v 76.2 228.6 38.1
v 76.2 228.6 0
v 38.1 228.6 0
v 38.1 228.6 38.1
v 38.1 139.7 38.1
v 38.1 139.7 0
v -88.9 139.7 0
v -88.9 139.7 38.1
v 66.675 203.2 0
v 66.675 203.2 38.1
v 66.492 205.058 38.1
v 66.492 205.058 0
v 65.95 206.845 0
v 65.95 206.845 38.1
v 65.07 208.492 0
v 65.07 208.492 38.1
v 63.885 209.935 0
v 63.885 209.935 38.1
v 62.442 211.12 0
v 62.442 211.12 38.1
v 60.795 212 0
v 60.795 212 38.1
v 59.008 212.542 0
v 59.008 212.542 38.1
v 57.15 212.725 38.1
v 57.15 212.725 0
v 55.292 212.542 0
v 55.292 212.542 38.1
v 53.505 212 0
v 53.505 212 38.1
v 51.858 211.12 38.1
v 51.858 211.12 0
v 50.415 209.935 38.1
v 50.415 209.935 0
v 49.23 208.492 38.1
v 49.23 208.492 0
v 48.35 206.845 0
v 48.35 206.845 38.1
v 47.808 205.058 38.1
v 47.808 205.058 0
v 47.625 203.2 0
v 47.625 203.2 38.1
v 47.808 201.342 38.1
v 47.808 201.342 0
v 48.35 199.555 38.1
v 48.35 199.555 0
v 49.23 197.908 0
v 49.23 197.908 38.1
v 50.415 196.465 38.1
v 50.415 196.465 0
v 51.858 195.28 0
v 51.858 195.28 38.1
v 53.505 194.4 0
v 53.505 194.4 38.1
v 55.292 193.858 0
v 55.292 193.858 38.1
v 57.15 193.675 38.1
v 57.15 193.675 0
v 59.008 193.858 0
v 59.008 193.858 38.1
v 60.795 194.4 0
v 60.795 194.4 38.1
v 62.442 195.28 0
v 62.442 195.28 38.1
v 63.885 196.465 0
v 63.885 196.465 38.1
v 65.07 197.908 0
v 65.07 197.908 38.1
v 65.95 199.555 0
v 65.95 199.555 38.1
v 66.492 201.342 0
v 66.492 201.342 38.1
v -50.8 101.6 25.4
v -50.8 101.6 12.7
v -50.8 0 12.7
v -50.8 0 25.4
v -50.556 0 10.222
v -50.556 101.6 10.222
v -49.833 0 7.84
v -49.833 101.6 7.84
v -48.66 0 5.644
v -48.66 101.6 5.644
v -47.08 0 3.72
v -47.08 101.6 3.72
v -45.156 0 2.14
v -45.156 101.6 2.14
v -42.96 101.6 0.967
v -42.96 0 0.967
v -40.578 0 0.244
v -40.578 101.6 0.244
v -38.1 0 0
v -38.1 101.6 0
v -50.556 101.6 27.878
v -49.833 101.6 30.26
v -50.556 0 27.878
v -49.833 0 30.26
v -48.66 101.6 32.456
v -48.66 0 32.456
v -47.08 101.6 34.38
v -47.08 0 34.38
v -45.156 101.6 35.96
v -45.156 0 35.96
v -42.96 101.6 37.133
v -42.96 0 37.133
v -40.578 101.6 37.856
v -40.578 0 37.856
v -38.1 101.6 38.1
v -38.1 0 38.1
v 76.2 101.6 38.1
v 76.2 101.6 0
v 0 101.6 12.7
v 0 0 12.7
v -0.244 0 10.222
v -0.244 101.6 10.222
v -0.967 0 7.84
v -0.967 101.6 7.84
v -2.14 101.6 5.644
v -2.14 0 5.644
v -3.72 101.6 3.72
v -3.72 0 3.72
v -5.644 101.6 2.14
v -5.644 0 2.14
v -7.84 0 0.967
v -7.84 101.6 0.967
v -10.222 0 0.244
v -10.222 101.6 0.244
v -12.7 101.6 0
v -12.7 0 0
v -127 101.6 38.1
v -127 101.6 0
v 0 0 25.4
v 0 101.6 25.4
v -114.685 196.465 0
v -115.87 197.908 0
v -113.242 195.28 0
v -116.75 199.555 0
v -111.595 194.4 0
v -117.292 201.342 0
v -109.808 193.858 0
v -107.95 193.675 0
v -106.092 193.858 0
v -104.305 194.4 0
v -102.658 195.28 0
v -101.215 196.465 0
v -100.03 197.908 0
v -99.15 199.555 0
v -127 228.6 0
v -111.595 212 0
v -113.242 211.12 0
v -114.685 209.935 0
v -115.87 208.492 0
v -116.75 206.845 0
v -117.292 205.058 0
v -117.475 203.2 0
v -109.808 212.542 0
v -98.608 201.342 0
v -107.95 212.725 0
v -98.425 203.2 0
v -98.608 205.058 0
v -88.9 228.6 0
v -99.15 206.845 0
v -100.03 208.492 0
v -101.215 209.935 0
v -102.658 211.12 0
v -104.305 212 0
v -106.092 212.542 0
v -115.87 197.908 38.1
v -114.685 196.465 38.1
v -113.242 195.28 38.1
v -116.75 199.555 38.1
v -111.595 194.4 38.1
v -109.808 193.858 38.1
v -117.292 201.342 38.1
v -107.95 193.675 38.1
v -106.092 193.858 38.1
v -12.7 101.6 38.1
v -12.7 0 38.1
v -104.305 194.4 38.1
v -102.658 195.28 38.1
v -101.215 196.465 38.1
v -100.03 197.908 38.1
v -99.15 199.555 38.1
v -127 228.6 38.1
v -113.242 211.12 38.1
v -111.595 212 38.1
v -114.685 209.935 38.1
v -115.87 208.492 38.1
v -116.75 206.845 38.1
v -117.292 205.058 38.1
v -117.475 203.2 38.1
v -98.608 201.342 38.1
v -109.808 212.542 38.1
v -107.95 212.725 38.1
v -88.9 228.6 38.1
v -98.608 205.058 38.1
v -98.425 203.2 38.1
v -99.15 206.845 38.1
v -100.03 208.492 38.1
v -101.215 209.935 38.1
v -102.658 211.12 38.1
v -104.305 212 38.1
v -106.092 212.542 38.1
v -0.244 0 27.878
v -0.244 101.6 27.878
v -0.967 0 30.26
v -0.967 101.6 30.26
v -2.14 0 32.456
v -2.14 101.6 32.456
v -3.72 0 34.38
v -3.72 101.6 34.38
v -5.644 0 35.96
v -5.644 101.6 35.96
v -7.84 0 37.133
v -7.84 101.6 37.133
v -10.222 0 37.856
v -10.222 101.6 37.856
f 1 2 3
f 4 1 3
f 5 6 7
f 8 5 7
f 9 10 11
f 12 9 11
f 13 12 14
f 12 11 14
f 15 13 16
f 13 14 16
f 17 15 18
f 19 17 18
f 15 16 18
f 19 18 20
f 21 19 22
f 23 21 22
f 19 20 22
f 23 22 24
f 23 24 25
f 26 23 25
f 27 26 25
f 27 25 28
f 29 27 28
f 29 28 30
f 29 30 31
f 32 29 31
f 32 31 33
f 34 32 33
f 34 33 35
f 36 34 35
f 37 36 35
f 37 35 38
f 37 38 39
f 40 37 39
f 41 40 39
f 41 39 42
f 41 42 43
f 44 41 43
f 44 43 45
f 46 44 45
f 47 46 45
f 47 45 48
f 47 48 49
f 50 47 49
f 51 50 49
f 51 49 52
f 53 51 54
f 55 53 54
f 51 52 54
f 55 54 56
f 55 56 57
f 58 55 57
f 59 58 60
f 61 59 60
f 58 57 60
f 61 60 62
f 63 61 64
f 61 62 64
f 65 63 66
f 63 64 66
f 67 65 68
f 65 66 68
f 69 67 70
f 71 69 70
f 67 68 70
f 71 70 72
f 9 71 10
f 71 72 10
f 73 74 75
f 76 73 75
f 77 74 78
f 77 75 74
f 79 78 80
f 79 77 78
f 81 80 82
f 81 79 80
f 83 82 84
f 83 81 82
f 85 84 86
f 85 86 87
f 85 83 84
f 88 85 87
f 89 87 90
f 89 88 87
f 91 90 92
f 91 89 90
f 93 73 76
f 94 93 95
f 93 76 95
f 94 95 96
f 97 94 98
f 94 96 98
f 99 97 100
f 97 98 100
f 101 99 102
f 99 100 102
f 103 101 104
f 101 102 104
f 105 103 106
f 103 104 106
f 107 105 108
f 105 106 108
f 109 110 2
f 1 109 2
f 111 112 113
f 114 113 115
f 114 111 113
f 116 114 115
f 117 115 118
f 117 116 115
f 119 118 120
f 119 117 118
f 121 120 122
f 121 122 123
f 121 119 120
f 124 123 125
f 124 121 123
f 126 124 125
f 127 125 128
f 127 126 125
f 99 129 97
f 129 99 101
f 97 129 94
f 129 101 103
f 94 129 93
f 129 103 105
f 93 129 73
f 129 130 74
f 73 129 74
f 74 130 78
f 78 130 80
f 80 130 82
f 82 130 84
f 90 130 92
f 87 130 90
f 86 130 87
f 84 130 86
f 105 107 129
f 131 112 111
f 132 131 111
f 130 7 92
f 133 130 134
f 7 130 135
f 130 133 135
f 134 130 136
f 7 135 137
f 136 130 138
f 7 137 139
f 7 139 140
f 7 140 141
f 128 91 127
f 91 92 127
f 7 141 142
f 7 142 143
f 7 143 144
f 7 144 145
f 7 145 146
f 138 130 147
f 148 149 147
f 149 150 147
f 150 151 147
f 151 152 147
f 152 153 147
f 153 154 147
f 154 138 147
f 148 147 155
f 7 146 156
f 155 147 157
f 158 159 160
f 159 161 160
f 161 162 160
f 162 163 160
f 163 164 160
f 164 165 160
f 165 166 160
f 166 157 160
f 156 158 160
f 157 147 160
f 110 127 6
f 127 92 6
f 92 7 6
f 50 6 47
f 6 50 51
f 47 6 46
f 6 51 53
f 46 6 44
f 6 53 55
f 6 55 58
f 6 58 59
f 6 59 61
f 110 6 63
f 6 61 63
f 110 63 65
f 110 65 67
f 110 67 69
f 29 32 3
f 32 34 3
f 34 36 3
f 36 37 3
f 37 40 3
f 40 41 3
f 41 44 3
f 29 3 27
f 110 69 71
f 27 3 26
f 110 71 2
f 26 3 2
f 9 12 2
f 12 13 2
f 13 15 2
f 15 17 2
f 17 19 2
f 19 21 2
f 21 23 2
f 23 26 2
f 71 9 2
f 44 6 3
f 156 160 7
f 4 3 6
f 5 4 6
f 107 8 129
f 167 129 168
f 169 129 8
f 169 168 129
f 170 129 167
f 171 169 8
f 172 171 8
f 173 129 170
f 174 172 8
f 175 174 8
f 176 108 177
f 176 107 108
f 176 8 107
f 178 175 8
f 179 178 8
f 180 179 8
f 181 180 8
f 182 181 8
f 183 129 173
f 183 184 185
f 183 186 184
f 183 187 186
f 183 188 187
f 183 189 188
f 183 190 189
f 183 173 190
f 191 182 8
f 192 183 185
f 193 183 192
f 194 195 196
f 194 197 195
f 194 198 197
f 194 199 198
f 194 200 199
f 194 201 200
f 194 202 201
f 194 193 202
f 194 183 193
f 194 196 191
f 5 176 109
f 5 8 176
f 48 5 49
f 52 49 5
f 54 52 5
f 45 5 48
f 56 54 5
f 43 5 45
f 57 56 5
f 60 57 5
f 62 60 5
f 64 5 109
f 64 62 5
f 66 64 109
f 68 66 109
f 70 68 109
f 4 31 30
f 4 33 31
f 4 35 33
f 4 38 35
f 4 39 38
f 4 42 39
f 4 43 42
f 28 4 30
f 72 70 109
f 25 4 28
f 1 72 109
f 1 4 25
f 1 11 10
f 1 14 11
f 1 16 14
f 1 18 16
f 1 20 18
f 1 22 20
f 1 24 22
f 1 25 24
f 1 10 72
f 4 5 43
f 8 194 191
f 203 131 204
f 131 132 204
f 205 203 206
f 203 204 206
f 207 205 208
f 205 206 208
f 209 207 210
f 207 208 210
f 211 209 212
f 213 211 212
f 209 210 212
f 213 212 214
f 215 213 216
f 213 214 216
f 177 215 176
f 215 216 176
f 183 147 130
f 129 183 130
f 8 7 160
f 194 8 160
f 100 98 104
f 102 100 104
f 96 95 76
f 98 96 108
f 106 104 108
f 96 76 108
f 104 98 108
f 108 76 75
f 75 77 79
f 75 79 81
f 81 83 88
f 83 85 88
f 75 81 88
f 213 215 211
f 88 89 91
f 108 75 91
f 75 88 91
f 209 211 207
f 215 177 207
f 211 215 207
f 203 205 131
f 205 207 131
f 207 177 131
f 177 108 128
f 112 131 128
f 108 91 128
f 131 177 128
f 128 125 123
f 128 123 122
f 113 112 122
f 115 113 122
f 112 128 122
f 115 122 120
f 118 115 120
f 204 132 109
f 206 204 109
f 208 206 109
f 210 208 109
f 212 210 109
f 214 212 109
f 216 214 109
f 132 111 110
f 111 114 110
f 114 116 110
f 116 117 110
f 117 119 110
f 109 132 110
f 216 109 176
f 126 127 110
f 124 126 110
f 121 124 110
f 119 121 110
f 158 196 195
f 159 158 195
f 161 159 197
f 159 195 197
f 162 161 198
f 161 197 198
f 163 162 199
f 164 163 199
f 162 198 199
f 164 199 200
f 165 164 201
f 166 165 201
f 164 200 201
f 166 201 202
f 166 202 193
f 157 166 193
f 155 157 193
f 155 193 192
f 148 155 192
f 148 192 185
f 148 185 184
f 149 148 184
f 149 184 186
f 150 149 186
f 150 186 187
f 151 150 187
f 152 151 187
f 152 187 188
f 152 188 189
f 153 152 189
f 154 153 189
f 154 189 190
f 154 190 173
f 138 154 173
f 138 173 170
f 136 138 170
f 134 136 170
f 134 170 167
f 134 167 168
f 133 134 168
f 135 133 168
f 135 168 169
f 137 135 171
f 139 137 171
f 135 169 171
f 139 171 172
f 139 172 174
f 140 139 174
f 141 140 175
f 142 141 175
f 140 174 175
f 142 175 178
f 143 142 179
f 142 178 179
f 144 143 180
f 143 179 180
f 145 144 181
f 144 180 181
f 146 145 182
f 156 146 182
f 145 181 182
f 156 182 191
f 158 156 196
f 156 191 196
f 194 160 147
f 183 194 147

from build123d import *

# Parameters (mm, degrees)
F0_W     = 38.1
F0_H     = 38.1
F1_DEPTH = 38.1
F2_R     = 12.7
F4_DEPTH = 38.101


with BuildPart() as f1:
    # F0 (on Top) → F1 (new body)
    with BuildSketch(Plane.XY):
        Polygon((-50.8, 0), (0, 0), (0, 101.6), (0, 139.7), (-50.8, 139.7), (-50.8, 101.6), align=None)
        with Locations((19.05, 120.65)):
            Rectangle(F0_W, F0_H)
        with Locations((-69.85, 120.65)):
            Rectangle(F0_W, F0_H)
        Polygon((38.1, 139.7), (38.1, 101.6), (76.2, 101.6), (76.2, 228.6), (38.1, 228.6), align=None)
        Polygon((-127, 101.6), (-88.9, 101.6), (-88.9, 139.7), (-88.9, 228.6), (-127, 228.6), align=None)
    extrude(amount=F1_DEPTH)

    # F2
    f2_edges = [f1.edges().sort_by_distance(p)[0] for p in [
        (0, 50.8, 38.1),
        (-50.8, 50.8, 38.1),
        (-50.8, 50.8, 0),
        (0, 50.8, 0),
    ]]
    fillet(f2_edges, radius=F2_R)

    # F3 (on face) → F4 (cut, through all)
    with BuildSketch(Plane.XY.offset(38.1)):
        with BuildLine():
            ThreePointArc((-117.475, 203.2), (-107.95, 193.675), (-98.425, 203.2))
            Line((-98.425, 203.2), (-117.475, 203.2))
        make_face()
        with BuildLine():
            Line((66.675, 203.2), (47.625, 203.2))
            ThreePointArc((47.625, 203.2), (57.15, 193.675), (66.675, 203.2))
        make_face()
        with BuildLine():
            ThreePointArc((66.675, 203.2), (57.15, 212.725), (47.625, 203.2))
            Line((47.625, 203.2), (66.675, 203.2))
        make_face()
        with BuildLine():
            Line((-117.475, 203.2), (-98.425, 203.2))
            ThreePointArc((-98.425, 203.2), (-107.95, 212.725), (-117.475, 203.2))
        make_face()
    extrude(amount=-F4_DEPTH, mode=Mode.SUBTRACT)


solid = f1.part
